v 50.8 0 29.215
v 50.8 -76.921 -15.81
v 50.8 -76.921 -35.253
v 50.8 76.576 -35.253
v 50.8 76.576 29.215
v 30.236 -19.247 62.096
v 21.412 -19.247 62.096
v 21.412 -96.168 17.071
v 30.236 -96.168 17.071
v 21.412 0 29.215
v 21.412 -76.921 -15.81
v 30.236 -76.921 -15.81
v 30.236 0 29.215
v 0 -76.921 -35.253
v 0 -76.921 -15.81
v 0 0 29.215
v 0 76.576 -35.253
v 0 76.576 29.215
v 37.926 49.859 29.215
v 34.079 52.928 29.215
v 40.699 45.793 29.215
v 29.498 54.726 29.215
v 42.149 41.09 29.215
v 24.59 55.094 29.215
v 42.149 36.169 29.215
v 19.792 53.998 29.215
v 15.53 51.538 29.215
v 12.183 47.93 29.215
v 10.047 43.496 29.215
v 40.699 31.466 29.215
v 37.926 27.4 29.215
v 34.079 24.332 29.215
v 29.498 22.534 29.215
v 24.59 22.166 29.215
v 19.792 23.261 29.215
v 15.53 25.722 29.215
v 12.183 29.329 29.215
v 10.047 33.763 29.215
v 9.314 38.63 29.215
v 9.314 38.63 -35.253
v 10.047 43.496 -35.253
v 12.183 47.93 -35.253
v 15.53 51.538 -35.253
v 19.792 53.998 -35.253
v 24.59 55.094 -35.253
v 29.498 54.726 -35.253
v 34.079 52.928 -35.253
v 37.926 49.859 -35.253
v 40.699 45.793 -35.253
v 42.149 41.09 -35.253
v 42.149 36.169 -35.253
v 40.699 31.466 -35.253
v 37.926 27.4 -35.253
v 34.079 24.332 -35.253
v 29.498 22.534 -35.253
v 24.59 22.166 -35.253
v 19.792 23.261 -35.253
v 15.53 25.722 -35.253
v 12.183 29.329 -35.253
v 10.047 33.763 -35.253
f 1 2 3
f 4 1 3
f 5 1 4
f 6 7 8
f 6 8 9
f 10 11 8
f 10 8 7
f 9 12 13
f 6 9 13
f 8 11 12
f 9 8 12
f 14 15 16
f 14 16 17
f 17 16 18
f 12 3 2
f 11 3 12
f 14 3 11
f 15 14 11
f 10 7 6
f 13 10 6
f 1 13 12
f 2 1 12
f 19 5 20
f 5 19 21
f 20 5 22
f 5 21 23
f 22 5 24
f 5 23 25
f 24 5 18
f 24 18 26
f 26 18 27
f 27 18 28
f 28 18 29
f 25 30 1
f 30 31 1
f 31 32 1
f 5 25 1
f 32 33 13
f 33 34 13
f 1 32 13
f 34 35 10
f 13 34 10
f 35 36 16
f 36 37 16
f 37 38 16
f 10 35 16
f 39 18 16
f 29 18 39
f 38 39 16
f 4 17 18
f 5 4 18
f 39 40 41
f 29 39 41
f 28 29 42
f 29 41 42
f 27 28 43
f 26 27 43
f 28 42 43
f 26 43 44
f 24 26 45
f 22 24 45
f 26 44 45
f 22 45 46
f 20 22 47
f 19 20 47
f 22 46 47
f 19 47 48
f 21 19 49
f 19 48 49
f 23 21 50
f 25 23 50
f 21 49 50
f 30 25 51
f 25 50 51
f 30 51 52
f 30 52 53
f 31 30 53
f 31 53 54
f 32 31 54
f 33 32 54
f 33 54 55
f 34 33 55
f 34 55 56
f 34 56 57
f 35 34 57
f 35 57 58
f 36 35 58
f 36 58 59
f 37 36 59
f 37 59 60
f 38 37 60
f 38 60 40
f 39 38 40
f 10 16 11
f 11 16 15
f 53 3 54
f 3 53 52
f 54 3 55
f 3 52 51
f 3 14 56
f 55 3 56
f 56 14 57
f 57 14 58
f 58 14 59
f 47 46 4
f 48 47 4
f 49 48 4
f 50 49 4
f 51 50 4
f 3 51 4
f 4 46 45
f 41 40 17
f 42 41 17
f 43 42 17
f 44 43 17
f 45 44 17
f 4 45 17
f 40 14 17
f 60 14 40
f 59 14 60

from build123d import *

# Parameters (mm, degrees)
F0_W     = 14.3263228238
F0_H     = 64.4684862345
F0_W_2   = 16.372948885
F0_W_3   = 15.3496470302
F0_W_4   = 24.5594233274
F0_H_2   = 19.4428749382
F1_DEPTH = 50.8
F2_W     = 8.8241882622
F2_H     = 89.1295920778
F3_DEPTH = 38.1
F5_D     = 33.02


with BuildPart() as f1:
    # F0 (on Right) → F1 (new body)
    with BuildSketch(Plane.YZ):
        with Locations((69.4126244634, -3.0189463869)):
            Rectangle(F0_W, F0_H)
        with Locations((54.0629886091, -3.0189463869)):
            Rectangle(F0_W_2, F0_H)
        with Locations((38.2016906515, -3.0189463869)):
            Rectangle(F0_W_3, F0_H)
        Polygon((30.5268671364, -35.2531895041), (30.5268671364, 29.2152967304), (0, 29.2152967304), (0, -15.8103145659), (-52.3611754179, -15.8103145659), (-52.3611754179, -35.2531895041), align=None)
        Polygon((0, -15.8103145659), (0, 29.2152967304), (-76.9205987453, -15.8103145659), (-52.3611754179, -15.8103145659), align=None)
        with Locations((-64.6408870816, -25.531752035)):
            Rectangle(F0_W_4, F0_H_2)
    extrude(amount=F1_DEPTH)

    # F2 (on face) → F3 (join)
    with BuildSketch(Plane(origin=(0, -12.7370466018, 21.7596435151), x_dir=(1, 0, 0), z_dir=(0, -0.5051701713, 0.8630197553))):
        with Locations((25.8237272501, -29.8060995855)):
            Rectangle(F2_W, F2_H)
    extrude(amount=F3_DEPTH)

    # F5 (through all)
    with Locations(Plane.XY.offset(29.2152967304)):
        with Locations((25.8237272501, 38.6297218502)):
            Hole(F5_D / 2)


solid = f1.part
